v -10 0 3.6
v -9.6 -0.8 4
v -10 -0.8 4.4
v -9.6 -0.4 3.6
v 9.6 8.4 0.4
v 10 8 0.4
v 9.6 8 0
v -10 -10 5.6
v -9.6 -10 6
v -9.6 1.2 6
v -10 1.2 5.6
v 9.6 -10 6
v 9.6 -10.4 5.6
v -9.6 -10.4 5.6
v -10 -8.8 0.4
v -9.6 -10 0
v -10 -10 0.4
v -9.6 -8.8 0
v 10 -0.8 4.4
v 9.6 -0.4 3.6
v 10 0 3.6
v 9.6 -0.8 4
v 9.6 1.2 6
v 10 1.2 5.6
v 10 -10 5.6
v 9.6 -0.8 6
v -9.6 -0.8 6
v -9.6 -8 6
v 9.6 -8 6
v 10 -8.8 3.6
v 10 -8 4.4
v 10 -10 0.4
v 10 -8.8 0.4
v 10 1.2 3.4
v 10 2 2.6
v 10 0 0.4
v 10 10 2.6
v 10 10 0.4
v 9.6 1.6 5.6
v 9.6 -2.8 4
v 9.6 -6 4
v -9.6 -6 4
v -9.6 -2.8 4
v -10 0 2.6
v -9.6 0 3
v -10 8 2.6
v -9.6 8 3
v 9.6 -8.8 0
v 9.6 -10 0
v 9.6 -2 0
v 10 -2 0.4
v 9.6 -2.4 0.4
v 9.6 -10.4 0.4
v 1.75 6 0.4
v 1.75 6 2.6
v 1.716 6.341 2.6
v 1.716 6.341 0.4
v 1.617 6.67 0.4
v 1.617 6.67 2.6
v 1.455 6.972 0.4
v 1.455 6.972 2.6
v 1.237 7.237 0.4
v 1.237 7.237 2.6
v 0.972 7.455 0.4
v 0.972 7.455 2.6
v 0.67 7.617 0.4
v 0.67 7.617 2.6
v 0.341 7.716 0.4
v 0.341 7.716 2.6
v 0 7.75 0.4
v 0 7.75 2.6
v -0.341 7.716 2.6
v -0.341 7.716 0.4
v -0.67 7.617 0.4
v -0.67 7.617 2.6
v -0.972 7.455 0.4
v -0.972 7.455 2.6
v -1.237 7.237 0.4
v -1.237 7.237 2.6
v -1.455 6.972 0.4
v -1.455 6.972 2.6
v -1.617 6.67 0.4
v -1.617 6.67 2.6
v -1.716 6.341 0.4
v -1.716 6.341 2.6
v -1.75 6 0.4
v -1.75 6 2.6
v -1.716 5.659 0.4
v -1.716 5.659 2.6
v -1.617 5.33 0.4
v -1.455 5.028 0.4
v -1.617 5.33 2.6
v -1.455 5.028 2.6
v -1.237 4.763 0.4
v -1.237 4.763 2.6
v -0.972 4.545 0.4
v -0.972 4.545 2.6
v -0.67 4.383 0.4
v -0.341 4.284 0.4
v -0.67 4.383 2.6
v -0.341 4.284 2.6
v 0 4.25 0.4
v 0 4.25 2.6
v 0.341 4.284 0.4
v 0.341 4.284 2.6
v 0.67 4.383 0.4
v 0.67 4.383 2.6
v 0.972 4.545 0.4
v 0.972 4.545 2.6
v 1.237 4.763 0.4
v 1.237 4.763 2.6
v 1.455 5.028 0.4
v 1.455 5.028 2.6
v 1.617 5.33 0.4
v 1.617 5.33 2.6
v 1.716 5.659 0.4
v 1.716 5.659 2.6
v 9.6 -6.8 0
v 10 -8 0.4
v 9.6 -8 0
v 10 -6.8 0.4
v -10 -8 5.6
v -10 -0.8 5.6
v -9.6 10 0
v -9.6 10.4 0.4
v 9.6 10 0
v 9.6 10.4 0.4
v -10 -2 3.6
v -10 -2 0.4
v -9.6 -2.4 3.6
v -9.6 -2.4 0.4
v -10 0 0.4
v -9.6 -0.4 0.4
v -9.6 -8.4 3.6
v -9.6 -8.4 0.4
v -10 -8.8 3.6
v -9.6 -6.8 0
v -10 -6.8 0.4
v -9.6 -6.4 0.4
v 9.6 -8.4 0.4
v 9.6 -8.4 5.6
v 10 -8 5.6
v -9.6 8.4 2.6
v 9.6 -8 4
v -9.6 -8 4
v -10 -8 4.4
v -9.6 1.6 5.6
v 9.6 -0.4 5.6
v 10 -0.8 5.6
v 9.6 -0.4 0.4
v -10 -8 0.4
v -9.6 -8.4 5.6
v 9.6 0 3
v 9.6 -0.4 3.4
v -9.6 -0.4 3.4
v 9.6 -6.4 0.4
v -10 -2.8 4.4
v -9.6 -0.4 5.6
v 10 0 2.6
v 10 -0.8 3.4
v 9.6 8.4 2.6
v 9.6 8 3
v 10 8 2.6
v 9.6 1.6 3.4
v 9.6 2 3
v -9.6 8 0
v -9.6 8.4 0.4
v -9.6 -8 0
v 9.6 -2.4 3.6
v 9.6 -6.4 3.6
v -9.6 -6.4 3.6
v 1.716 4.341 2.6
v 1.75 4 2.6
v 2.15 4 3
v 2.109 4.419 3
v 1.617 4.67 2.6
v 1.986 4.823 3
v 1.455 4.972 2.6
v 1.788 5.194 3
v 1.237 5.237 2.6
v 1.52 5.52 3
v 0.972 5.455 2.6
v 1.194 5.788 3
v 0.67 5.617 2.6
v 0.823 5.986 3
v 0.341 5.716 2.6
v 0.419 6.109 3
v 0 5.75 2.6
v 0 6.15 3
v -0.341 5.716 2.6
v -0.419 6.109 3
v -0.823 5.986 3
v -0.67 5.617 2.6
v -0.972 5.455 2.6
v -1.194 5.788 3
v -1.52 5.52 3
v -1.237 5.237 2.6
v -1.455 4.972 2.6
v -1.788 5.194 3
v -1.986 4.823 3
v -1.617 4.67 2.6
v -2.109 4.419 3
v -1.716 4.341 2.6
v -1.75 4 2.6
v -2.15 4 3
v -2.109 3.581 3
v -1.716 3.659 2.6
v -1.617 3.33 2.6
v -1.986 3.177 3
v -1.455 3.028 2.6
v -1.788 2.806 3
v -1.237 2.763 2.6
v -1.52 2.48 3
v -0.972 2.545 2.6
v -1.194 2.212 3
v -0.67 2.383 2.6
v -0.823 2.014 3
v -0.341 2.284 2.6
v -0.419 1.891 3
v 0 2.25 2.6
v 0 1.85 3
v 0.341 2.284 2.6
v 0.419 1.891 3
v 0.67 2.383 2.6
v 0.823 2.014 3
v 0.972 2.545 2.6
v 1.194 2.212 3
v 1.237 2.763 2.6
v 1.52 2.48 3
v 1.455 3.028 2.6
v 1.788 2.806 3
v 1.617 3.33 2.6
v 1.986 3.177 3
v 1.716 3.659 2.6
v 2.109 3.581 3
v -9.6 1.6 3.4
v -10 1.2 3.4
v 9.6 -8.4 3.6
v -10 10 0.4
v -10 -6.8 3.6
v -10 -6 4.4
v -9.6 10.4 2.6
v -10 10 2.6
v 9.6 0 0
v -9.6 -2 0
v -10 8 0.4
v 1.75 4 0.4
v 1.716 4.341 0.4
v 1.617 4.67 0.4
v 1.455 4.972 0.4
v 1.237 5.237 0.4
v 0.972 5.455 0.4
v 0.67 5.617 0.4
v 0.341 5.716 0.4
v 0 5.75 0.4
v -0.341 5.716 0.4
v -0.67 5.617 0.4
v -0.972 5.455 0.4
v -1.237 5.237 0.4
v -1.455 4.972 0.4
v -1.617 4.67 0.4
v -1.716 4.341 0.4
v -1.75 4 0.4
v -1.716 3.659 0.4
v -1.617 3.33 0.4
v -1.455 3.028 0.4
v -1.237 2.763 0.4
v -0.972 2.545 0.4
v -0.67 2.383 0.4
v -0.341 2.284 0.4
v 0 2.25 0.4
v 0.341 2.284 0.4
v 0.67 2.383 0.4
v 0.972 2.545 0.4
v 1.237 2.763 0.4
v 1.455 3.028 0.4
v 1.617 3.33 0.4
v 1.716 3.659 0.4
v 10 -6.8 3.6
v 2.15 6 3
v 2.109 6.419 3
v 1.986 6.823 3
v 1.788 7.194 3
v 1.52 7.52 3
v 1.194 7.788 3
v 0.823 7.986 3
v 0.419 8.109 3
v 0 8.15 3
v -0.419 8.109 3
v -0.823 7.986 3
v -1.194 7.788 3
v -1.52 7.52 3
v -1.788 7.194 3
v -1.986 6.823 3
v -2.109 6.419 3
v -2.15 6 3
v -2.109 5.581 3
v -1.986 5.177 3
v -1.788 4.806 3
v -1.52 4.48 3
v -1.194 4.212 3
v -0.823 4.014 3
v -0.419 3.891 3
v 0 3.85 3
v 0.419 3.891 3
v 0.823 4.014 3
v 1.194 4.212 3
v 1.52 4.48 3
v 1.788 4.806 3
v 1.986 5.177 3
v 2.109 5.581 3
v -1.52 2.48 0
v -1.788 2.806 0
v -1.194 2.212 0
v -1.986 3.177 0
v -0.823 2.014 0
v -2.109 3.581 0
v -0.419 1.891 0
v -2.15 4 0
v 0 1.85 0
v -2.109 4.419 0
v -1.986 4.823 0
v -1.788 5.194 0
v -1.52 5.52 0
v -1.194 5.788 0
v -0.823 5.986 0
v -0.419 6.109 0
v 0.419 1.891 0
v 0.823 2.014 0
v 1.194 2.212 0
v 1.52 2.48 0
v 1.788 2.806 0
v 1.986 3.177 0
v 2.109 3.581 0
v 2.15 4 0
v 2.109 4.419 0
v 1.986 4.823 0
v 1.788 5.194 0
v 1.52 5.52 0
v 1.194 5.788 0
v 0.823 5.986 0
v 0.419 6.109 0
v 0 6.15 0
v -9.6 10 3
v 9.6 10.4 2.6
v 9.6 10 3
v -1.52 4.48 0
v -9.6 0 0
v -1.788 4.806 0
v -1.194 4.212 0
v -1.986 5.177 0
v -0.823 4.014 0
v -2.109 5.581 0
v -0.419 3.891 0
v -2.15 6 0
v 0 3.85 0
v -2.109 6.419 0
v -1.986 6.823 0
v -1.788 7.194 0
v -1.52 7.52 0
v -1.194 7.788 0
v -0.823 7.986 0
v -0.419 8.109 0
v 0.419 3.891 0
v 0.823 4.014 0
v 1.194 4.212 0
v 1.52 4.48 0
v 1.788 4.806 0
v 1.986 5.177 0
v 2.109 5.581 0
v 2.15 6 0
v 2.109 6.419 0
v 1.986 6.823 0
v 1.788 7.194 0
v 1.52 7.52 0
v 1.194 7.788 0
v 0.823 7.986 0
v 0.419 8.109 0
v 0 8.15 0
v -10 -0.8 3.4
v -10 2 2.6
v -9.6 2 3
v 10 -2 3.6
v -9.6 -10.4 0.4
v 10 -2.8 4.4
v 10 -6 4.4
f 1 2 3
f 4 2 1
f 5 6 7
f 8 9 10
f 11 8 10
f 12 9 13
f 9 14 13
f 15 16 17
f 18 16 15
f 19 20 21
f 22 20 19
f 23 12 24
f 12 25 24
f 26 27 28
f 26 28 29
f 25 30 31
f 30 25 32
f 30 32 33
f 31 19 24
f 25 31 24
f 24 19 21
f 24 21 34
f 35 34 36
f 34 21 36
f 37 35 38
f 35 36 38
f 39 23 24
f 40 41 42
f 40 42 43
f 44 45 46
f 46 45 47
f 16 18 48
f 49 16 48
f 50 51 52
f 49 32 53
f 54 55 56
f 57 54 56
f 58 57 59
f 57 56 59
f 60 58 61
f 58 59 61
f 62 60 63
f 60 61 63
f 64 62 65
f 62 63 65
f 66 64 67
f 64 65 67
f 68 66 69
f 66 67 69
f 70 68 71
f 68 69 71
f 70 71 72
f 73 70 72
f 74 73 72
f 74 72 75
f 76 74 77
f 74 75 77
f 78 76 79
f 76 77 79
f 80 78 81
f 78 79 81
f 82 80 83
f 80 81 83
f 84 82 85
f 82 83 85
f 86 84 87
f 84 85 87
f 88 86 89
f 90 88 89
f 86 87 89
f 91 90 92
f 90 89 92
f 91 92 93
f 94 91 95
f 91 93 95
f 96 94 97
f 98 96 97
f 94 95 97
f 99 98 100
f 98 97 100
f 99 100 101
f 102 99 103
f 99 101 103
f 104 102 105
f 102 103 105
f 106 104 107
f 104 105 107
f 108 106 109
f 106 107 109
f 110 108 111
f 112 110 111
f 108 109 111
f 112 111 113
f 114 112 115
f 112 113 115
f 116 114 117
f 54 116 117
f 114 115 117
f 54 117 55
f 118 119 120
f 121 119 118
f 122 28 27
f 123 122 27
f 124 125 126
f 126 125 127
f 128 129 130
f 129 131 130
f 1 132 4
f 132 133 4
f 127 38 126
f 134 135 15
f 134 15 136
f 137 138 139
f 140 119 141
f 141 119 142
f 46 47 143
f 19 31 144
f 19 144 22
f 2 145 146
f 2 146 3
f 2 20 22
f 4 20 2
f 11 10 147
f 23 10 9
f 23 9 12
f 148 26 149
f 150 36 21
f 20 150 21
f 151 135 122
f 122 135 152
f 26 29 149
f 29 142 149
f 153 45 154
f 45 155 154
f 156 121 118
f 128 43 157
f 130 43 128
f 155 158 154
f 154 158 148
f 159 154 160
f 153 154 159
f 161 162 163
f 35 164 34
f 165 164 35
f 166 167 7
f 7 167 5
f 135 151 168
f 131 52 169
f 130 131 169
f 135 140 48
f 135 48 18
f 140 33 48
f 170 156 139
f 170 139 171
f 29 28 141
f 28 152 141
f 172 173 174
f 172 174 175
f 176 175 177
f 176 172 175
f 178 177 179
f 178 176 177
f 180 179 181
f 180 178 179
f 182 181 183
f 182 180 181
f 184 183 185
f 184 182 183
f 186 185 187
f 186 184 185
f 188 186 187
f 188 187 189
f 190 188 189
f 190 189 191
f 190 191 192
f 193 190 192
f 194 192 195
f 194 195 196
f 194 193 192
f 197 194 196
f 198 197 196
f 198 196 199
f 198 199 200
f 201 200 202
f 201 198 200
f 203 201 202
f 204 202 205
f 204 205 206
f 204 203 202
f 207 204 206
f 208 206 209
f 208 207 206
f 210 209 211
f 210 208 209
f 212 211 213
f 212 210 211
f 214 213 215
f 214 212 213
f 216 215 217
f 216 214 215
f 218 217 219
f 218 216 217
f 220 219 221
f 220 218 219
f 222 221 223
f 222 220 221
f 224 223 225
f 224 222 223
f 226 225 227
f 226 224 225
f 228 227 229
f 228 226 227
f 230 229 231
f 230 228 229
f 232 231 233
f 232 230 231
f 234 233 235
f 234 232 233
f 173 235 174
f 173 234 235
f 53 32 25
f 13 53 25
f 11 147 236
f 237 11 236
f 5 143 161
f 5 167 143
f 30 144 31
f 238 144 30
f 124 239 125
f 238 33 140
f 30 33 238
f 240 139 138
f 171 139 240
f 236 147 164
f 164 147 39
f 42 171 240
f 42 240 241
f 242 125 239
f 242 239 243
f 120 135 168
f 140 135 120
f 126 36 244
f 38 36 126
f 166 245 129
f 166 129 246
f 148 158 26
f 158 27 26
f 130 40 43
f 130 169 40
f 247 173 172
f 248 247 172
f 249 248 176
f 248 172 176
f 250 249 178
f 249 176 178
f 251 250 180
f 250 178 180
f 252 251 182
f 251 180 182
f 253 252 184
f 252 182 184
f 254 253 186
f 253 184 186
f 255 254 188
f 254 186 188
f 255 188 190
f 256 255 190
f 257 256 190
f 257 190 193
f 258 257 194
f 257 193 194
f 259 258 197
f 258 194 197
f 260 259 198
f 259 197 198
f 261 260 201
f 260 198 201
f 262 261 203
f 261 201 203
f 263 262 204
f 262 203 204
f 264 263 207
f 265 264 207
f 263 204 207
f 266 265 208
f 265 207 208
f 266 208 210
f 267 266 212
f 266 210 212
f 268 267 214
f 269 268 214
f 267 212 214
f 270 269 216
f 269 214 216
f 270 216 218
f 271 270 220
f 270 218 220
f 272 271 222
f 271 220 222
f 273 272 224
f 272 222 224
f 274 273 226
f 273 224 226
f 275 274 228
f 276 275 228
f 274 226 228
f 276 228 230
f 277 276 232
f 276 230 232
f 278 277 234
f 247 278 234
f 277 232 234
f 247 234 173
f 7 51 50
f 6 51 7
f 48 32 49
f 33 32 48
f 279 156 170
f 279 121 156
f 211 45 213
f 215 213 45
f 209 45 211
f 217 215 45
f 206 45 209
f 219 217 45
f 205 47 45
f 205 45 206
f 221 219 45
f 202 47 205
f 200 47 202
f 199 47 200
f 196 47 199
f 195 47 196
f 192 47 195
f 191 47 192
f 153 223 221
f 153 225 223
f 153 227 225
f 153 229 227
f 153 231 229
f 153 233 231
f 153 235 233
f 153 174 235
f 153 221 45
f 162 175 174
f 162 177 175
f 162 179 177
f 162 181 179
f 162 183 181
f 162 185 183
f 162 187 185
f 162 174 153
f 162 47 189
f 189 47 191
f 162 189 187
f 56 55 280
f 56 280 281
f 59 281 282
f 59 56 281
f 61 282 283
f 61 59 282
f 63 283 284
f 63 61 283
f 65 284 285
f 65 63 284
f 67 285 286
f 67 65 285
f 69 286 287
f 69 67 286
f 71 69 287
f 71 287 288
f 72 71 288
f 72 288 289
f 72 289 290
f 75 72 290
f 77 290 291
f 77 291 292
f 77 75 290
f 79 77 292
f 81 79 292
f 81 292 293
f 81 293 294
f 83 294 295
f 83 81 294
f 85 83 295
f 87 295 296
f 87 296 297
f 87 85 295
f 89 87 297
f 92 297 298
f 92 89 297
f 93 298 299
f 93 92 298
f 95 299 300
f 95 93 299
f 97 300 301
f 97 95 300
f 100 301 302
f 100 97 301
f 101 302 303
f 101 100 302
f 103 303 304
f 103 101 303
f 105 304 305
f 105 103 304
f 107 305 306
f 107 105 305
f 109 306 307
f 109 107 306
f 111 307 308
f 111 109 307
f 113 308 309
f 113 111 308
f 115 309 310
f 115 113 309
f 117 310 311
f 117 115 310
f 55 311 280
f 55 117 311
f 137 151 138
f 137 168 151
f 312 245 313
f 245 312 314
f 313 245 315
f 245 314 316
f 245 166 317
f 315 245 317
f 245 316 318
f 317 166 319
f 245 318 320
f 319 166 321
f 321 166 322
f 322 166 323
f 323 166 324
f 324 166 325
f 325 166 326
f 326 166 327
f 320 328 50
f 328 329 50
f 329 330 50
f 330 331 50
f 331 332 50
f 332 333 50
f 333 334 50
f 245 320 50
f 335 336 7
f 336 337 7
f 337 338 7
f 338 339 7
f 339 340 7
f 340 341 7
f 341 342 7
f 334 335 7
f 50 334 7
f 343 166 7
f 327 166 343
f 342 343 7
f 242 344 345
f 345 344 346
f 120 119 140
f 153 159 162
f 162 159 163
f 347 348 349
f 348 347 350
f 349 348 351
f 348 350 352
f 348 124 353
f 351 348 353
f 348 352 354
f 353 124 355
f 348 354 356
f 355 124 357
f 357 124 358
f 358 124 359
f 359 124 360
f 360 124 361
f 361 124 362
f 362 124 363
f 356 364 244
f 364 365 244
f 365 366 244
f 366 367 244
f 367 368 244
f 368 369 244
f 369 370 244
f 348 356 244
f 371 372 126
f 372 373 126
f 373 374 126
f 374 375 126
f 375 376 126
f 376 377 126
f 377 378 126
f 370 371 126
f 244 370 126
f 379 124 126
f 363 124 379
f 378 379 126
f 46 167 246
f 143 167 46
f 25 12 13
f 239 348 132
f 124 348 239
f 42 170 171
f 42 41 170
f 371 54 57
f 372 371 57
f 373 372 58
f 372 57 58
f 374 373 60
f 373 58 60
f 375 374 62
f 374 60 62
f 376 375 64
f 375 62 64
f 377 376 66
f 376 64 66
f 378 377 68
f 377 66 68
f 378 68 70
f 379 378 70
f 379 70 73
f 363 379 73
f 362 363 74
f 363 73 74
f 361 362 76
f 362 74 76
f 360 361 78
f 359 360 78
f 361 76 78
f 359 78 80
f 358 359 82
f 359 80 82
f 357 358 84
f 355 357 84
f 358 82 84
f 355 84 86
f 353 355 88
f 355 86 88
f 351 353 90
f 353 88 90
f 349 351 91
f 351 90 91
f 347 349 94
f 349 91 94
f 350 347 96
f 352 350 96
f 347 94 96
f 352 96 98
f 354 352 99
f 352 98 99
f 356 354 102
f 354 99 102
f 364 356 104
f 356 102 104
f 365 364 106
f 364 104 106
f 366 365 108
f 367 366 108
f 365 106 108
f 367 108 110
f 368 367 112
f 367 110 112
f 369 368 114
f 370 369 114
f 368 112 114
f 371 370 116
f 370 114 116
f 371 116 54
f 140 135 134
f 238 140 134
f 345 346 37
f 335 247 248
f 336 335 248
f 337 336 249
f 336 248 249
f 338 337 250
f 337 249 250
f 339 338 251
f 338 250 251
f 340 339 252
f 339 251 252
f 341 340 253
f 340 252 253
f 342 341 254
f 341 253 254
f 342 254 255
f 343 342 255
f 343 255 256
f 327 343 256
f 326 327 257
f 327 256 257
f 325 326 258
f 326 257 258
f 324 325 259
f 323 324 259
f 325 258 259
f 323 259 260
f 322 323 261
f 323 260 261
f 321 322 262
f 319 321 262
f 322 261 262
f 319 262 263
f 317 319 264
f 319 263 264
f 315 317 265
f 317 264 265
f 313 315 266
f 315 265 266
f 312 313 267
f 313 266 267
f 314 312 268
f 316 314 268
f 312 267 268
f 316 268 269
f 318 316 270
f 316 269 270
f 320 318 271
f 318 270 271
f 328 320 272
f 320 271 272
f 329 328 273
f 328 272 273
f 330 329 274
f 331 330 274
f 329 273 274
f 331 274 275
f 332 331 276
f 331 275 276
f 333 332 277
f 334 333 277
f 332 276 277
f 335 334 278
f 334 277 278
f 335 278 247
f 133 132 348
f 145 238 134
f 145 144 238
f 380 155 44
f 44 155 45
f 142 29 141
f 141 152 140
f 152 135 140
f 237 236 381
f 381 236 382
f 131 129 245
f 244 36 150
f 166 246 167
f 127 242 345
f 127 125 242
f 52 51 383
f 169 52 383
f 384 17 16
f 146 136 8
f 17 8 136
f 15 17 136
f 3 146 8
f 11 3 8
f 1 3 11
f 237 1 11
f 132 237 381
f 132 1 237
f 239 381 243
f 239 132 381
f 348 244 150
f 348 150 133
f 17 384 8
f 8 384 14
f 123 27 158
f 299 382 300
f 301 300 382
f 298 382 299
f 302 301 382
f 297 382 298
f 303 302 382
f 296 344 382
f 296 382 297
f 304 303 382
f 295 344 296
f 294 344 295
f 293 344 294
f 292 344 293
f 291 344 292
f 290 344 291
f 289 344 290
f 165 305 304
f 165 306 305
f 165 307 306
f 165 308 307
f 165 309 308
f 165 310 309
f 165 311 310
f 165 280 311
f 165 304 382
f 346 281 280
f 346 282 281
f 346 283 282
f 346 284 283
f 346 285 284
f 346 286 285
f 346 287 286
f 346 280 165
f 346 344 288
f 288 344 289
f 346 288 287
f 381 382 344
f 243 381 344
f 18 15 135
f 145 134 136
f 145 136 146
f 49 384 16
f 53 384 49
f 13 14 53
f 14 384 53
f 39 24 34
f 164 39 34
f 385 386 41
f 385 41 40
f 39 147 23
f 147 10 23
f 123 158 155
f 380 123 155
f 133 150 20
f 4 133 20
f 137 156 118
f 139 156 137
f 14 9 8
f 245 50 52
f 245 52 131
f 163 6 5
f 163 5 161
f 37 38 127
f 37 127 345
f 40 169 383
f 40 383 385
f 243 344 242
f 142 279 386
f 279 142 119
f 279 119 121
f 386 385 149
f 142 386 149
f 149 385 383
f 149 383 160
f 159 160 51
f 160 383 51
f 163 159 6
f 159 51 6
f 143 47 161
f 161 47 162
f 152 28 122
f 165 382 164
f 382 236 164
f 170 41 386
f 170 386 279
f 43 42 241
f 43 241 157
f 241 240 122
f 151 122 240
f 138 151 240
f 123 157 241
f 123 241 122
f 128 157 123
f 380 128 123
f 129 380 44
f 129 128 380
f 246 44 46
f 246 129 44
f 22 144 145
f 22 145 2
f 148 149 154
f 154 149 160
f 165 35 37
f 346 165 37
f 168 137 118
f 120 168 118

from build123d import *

# Parameters (mm, degrees)
SKETCH_W        = 20
SKETCH_H        = 20.8
PAD_DEPTH       = 6
SKETCH001_W     = 8
SKETCH001_H     = 4
POCKET_DEPTH    = 20
SKETCH002_W     = 20
SKETCH002_H     = 8.8
POCKET001_DEPTH = 3
SKETCH003_R     = 1.75
POCKET002_DEPTH = 3
CHAMFER_SIZE    = 0.4
SKETCH004_W     = 20
SKETCH004_H     = 16.8
PAD001_DEPTH    = 6
SKETCH005_W     = 4
SKETCH005_H     = 4
POCKET003_DEPTH = 20
SKETCH006_W     = 20
SKETCH006_H     = 8.8
POCKET004_DEPTH = 3
SKETCH007_R     = 1.75
POCKET005_DEPTH = 3
CHAMFER001_SIZE = 0.4


with BuildPart() as f_14_2_romex:
    # Sketch → Pad (new body)
    with BuildSketch(Plane.XY):
        Rectangle(SKETCH_W, SKETCH_H)
    extrude(amount=PAD_DEPTH)

    # Sketch001 (on Face2 of Pad) → Pocket (cut)
    with BuildSketch(Plane.YZ.offset(10)):
        with Locations((-4.4, 2)):
            Rectangle(SKETCH001_W, SKETCH001_H)
    extrude(amount=-POCKET_DEPTH, mode=Mode.SUBTRACT)

    # Sketch002 (on Face5 of Pocket) → Pocket001 (cut)
    with BuildSketch(Plane.XY.offset(6)):
        with Locations((0, 6)):
            Rectangle(SKETCH002_W, SKETCH002_H)
    extrude(amount=-POCKET001_DEPTH, mode=Mode.SUBTRACT)

    # Sketch003 (on Face4 of Pocket001) → Pocket002 (cut)
    with BuildSketch(Plane.XY.offset(3)):
        with Locations((0, 6)):
            Circle(SKETCH003_R)
    extrude(amount=-POCKET002_DEPTH, mode=Mode.SUBTRACT)

    # Chamfer
    chamfer_edges = [f_14_2_romex.edges().sort_by_distance(p)[0] for p in [
        (0, 1.6, 6),
        (10, -4.4, 6),
        (0, -10.4, 6),
        (-10, -4.4, 6),
        (0, 10.4, 3),
        (-10, 6, 3),
        (10, 6, 3),
        (0, 1.6, 3),
        (-1.75, 6, 3),
        (10, 5, 0),
        (10, -0.4, 2),
        (10, -4.4, 4),
        (10, -8.4, 2),
        (10, -9.4, 0),
        (10, -10.4, 3),
        (10, 1.6, 4.5),
        (10, 10.4, 1.5),
        (-10, -9.4, 0),
        (-10, -8.4, 2),
        (-10, -4.4, 4),
        (-10, -0.4, 2),
        (-10, 5, 0),
        (-10, 10.4, 1.5),
        (-10, 1.6, 4.5),
        (-10, -10.4, 3),
        (0, -10.4, 0),
        (0, 10.4, 0),
        (0, -0.4, 0),
        (-1.75, 6, 0),
        (0, -8.4, 0),
        (0, -0.4, 4),
        (0, -8.4, 4),
    ]]
    chamfer(chamfer_edges, length=CHAMFER_SIZE)


with BuildPart() as f_4_18gauge_wires:
    # Sketch004 → Pad001 (new body)
    with BuildSketch(Plane.XY):
        Rectangle(SKETCH004_W, SKETCH004_H)
    extrude(amount=PAD001_DEPTH)

    # Sketch005 (on Face2 of Pad001) → Pocket003 (cut)
    with BuildSketch(Plane.YZ.offset(10)):
        with Locations((-4.4, 2)):
            Rectangle(SKETCH005_W, SKETCH005_H)
    extrude(amount=-POCKET003_DEPTH, mode=Mode.SUBTRACT)

    # Sketch006 (on Face5 of Pocket003) → Pocket004 (cut)
    with BuildSketch(Plane.XY.offset(6)):
        with Locations((0, 4)):
            Rectangle(SKETCH006_W, SKETCH006_H)
    extrude(amount=-POCKET004_DEPTH, mode=Mode.SUBTRACT)

    # Sketch007 (on Face4 of Pocket004) → Pocket005 (cut)
    with BuildSketch(Plane.XY.offset(3)):
        with Locations((0, 4)):
            Circle(SKETCH007_R)
    extrude(amount=-POCKET005_DEPTH, mode=Mode.SUBTRACT)

    # Chamfer001
    chamfer001_edges = [f_4_18gauge_wires.edges().sort_by_distance(p)[0] for p in [
        (0, -0.4, 6),
        (10, -4.4, 6),
        (0, -8.4, 6),
        (-10, -4.4, 6),
        (0, 8.4, 3),
        (-10, 4, 3),
        (10, 4, 3),
        (0, -0.4, 3),
        (-1.75, 4, 3),
        (10, 3, 0),
        (10, -2.4, 2),
        (10, -4.4, 4),
        (10, -6.4, 2),
        (10, -7.4, 0),
        (10, -8.4, 3),
        (10, -0.4, 4.5),
        (10, 8.4, 1.5),
        (-10, -7.4, 0),
        (-10, -6.4, 2),
        (-10, -4.4, 4),
        (-10, -2.4, 2),
        (-10, 3, 0),
        (-10, 8.4, 1.5),
        (-10, -0.4, 4.5),
        (-10, -8.4, 3),
        (0, -8.4, 0),
        (0, 8.4, 0),
        (0, -2.4, 0),
        (-1.75, 4, 0),
        (0, -6.4, 0),
        (0, -2.4, 4),
        (0, -6.4, 4),
    ]]
    chamfer(chamfer001_edges, length=CHAMFER001_SIZE)


solid = Compound([f_14_2_romex.part, f_4_18gauge_wires.part])
